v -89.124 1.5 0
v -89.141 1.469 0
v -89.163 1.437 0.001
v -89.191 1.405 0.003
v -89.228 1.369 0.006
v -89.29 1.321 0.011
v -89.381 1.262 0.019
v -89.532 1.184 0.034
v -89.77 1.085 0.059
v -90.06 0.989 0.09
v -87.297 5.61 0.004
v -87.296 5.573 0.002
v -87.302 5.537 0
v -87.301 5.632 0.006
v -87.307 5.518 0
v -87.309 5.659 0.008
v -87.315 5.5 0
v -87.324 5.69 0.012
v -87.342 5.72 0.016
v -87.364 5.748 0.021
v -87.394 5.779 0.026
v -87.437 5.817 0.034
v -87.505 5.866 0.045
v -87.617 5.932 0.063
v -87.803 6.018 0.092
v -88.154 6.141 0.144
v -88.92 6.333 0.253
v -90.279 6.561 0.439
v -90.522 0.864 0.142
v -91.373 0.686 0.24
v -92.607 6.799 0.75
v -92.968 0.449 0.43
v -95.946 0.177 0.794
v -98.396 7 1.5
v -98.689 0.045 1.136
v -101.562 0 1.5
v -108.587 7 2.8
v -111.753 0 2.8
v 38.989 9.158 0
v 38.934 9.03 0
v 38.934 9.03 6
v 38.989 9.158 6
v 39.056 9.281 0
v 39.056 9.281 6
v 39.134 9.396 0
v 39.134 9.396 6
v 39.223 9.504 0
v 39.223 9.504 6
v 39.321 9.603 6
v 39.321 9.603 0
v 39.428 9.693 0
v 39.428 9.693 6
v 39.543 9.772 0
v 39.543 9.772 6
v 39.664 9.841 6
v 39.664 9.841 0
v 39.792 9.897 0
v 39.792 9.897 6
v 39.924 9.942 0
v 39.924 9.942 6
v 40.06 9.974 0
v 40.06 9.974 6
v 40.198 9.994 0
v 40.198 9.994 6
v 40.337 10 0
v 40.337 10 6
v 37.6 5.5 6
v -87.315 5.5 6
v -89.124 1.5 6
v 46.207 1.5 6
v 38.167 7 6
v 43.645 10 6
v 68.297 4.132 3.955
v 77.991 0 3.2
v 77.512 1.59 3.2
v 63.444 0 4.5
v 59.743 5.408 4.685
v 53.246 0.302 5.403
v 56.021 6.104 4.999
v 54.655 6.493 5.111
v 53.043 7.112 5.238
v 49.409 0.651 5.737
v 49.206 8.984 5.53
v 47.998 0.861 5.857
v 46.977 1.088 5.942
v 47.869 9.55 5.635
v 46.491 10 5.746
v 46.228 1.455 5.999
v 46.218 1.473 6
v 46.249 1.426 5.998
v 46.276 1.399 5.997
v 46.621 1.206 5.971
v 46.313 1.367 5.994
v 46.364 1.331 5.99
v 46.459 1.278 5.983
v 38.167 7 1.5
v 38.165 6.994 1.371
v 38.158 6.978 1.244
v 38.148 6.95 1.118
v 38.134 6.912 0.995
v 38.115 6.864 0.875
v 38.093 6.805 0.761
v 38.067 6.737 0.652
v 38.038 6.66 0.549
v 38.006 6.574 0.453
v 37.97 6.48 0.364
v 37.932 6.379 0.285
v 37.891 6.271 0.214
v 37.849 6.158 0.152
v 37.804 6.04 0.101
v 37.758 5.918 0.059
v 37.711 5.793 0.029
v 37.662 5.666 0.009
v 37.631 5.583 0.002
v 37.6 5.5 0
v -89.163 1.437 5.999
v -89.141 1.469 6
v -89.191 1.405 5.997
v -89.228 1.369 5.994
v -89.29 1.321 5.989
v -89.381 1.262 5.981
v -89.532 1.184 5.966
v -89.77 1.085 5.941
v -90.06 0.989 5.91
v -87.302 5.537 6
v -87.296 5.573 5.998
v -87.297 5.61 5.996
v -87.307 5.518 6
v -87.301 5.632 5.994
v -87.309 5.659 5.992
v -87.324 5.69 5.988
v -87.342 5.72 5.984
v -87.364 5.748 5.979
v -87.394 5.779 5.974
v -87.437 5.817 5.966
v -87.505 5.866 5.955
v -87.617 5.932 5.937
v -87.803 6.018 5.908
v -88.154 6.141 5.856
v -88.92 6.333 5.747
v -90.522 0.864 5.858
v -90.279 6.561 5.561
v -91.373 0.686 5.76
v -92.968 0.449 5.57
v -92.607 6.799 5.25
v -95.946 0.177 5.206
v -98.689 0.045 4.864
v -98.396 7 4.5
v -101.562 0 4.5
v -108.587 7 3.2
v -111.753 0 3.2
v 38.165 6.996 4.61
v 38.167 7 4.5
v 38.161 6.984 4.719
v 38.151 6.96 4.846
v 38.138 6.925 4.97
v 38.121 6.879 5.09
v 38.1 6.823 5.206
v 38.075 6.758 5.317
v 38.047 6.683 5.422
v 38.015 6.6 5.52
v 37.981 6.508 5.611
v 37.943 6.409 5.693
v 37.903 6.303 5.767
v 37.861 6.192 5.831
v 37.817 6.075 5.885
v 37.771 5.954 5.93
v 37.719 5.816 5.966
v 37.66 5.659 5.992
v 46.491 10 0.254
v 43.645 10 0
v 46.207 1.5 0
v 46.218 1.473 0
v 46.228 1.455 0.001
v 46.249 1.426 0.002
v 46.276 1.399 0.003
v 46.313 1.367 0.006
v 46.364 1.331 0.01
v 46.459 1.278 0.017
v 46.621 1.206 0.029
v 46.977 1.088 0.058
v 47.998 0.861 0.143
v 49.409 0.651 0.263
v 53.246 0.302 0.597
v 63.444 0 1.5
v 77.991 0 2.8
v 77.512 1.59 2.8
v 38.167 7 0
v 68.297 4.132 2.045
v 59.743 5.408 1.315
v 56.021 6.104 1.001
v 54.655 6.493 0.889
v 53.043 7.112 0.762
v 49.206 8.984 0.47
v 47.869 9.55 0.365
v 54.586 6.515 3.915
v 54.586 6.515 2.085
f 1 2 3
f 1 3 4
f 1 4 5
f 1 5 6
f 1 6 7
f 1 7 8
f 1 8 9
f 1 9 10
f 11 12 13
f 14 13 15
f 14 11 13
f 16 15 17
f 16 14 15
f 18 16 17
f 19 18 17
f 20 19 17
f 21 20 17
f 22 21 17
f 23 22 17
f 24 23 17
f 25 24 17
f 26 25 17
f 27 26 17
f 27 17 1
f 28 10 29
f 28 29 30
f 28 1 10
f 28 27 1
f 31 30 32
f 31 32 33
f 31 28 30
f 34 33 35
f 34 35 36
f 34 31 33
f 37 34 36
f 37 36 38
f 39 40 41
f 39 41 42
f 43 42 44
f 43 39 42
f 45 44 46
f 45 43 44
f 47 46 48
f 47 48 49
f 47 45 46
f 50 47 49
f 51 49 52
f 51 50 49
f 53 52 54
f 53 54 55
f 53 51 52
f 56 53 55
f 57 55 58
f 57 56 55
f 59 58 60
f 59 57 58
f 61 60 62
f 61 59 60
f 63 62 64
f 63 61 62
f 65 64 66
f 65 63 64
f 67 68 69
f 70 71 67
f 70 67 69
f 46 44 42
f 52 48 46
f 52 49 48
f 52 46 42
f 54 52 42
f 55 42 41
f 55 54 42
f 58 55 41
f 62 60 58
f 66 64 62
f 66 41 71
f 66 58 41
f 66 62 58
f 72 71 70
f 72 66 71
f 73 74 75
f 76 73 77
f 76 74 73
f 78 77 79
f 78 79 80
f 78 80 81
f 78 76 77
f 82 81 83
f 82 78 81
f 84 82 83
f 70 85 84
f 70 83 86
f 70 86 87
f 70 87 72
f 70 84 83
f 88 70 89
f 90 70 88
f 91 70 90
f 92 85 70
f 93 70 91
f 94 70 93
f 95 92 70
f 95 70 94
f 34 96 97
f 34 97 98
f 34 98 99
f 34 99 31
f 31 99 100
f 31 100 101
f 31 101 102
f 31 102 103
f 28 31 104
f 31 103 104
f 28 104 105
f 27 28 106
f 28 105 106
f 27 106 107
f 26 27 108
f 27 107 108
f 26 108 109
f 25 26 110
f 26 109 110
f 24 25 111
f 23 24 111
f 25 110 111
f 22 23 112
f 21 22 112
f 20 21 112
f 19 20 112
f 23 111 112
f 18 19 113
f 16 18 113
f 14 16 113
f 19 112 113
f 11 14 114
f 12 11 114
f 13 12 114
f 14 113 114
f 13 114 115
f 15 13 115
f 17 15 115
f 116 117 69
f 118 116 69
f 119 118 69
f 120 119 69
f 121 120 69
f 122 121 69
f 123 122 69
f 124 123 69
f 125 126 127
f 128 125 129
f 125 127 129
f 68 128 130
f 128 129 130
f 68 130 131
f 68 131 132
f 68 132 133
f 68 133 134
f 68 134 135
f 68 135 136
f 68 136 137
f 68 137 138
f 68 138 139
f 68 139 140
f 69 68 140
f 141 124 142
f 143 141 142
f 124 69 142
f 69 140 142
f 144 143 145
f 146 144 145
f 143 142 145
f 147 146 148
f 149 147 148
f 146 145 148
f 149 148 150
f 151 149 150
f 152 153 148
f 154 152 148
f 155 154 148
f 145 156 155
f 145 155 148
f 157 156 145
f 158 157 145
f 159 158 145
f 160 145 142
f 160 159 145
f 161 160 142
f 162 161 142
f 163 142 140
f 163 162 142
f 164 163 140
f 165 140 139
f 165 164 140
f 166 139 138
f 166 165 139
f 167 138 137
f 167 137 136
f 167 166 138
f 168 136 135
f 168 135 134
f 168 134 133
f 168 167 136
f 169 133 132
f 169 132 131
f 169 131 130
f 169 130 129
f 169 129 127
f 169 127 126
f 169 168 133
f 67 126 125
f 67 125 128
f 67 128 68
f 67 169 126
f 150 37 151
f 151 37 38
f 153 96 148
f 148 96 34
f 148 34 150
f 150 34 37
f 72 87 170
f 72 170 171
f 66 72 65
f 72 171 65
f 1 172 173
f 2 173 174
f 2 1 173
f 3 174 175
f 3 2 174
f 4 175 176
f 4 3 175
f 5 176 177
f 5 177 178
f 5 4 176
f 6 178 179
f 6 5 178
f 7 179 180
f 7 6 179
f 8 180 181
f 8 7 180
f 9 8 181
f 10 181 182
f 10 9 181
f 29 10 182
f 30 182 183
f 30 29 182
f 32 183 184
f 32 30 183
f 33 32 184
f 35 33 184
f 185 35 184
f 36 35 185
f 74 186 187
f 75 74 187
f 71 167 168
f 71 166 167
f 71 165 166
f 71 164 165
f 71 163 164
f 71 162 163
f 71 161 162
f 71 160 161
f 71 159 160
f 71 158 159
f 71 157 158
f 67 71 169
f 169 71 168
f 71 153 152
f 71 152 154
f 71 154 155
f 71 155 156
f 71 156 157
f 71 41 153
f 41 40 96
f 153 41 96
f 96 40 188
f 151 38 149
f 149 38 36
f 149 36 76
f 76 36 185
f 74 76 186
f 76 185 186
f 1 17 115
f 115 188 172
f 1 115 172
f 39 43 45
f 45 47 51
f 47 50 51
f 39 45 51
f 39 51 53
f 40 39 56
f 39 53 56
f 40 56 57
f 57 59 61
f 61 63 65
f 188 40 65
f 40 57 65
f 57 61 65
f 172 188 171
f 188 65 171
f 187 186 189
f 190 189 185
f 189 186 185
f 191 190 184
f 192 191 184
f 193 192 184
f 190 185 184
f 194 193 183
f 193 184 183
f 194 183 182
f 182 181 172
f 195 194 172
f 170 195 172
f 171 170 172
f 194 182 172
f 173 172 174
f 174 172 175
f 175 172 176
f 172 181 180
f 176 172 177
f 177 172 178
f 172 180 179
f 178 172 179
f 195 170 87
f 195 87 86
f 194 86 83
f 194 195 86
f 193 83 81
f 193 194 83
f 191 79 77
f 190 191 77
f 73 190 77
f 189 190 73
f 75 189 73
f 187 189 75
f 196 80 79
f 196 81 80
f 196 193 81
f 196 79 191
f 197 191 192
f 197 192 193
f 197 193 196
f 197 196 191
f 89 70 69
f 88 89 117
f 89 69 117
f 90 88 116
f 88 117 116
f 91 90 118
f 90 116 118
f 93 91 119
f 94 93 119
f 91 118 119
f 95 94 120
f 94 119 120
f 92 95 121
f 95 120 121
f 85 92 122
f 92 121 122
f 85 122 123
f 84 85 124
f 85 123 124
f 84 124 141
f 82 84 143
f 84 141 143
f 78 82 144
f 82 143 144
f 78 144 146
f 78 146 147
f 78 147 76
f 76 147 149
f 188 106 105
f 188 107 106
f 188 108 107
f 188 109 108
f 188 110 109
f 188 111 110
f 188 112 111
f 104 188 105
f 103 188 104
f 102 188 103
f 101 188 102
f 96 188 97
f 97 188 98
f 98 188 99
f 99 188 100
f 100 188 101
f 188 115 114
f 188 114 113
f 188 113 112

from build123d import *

# Parameters (mm, degrees)
F1_DEPTH     = 6
F2_T1_DEPTH  = 157.6354832979
F3_T1_DEPTH  = 180.911939444
F3_T3_DEPTH  = 11.1833176621
F3_T8_DEPTH  = 154.2537676368
F3_T13_DEPTH = 154.2537676368
F4_T1_DEPTH  = 108.3530023153


# Not quite as in the source:
# - a fillet or chamfer that OpenCascade refuses, or shapes differently, is made with other operations: its cross-section is extruded or revolved along the edge and cut away or added


with BuildPart() as f1:
    # F0 (on Top) → F1 (new body)
    with BuildSketch(Plane.XY):
        Polygon((38.1666665349, 7), (-81.8333334651, 7), (-81.8333334651, 0), (38.5162681341, 0), align=None)
        with BuildLine():
            Line((39.3004275709, 10), (38.1666665349, 7))
            Line((38.1666665349, 7), (38.5162681341, 0))
            Line((38.5162681341, 0), (46.4909672737, 0))
            Line((46.4909672737, 0), (77.9909640551, 0))
            Line((77.9909640551, 0), (77.5119066238, 1.5898427228))
            add(Edge.make_bspline(
                [(46.4909672737, 10), (49.5646846807, 9.1582136368), (54.0969093449, 5.5068681922), (67.4802237728, 4.9316783562), (74.0574866156, 2.5085939236), (77.5119066238, 1.5898427228)],
                knots=[0, 0, 0, 0, 0.3024831153, 0.6658844955, 1, 1, 1, 1], degree=3))
            Line((46.4909672737, 10), (39.3004275709, 10))
        make_face()
        Polygon((-81.8333334651, 0), (-81.8333334651, 7), (-108.5871011019, 7), (-111.7533296347, 0), align=None)
    extrude(amount=F1_DEPTH)

    # F2: chamfer of 30 x 2.8 on 2 edges, made by hand

    # F2_s2 → F2_t1 (cut)
    with BuildSketch(Plane(origin=(28.992055027, -96.2156198783, 0), x_dir=(0, 0, 1), z_dir=(-0.2885105142, 0.9574767272, 0))):
        Polygon((3.2, 74.6745330178), (6, 44.6745330178), (6, 74.6745330178), align=None)
        Polygon((2.8, 74.6745330178), (0, 44.6745330178), (0, 74.6745330178), align=None)
    extrude(amount=F2_T1_DEPTH, mode=Mode.SUBTRACT)

    # F3: fillet of radius 1.5 on 5 edges, made by hand

    # F3_s2 → F3_t1 (cut)
    with BuildSketch(Plane.YZ.offset(-115.5033296347)):
        with BuildLine():
            ThreePointArc((1.5, 6), (0.4393398282, 5.5606601718), (0, 4.5))
            Line((0, 4.5), (0, 6))
            Line((0, 6), (1.5, 6))
        make_face()
        with BuildLine():
            ThreePointArc((1.5, 0), (0.4393398282, 0.4393398282), (0, 1.5))
            Line((0, 1.5), (0, 0))
            Line((0, 0), (1.5, 0))
        make_face()
    extrude(amount=F3_T1_DEPTH, mode=Mode.SUBTRACT)

    # F3_s4 → F3_t3 (cut)
    with BuildSketch(Plane.XY.offset(-2.591658831)):
        with BuildLine():
            ThreePointArc((38.9339491071, 9.0302759078), (39.4842763115, 9.7339801177), (40.3370911034, 10))
            Line((40.3370911034, 10), (39.3004275709, 10))
            Line((39.3004275709, 10), (38.9339491071, 9.0302759078))
        make_face()
    extrude(amount=F3_T3_DEPTH, mode=Mode.SUBTRACT)


with BuildPart() as f3_tool6:
    # F3_s7 → F3_t8 (new body)
    with BuildSketch(Plane.YZ.offset(41.9166665349)):
        with BuildLine():
            ThreePointArc((7, 4.5), (6.5606601718, 5.5606601718), (5.5, 6))
            Line((5.5, 6), (7, 6))
            Line((7, 6), (7, 4.5))
        make_face()
    extrude(amount=-F3_T8_DEPTH)

    split(bisect_by=Plane(origin=(31.0819782613, -11.7465119587, 0), x_dir=(0, 0, 1), z_dir=(-0.9354279975, 0.3535172719, 0)), keep=Keep.TOP)


with BuildPart() as f1_1:
    add(f1.part)

    # F3_t5: cut F3_tool6
    add(f3_tool6.part, mode=Mode.SUBTRACT)


with BuildPart() as f3_tool11:
    # F3_s12 → F3_t13 (new body)
    with BuildSketch(Plane.YZ.offset(41.9166665349)):
        with BuildLine():
            ThreePointArc((7, 1.5), (6.5606601718, 0.4393398282), (5.5, 0))
            Line((5.5, 0), (7, 0))
            Line((7, 0), (7, 1.5))
        make_face()
    extrude(amount=-F3_T13_DEPTH)

    split(bisect_by=Plane(origin=(31.0819782613, -11.7465119587, 0), x_dir=(0, 0, 1), z_dir=(-0.9354279975, 0.3535172719, 0)), keep=Keep.TOP)


with BuildPart() as f1_2:
    add(f1_1.part)

    # F3_t10: cut F3_tool11
    add(f3_tool11.part, mode=Mode.SUBTRACT)

    # F4: chamfer of 20 x 2.8 on 2 edges, made by hand

    # F4_s2 → F4_t1 (cut)
    with BuildSketch(Plane(origin=(4.9298048814, 10.8989713826, 0), x_dir=(0, 0, 1), z_dir=(-0.4121205293, -0.9111293373, 0))):
        Polygon((6, 81.8217371748), (3.2, 101.8217371748), (6, 101.8217371748), align=None)
        Polygon((0, 81.8217371748), (2.8, 101.8217371748), (0, 101.8217371748), align=None)
    extrude(amount=F4_T1_DEPTH, mode=Mode.SUBTRACT)


solid = f1_2.part
